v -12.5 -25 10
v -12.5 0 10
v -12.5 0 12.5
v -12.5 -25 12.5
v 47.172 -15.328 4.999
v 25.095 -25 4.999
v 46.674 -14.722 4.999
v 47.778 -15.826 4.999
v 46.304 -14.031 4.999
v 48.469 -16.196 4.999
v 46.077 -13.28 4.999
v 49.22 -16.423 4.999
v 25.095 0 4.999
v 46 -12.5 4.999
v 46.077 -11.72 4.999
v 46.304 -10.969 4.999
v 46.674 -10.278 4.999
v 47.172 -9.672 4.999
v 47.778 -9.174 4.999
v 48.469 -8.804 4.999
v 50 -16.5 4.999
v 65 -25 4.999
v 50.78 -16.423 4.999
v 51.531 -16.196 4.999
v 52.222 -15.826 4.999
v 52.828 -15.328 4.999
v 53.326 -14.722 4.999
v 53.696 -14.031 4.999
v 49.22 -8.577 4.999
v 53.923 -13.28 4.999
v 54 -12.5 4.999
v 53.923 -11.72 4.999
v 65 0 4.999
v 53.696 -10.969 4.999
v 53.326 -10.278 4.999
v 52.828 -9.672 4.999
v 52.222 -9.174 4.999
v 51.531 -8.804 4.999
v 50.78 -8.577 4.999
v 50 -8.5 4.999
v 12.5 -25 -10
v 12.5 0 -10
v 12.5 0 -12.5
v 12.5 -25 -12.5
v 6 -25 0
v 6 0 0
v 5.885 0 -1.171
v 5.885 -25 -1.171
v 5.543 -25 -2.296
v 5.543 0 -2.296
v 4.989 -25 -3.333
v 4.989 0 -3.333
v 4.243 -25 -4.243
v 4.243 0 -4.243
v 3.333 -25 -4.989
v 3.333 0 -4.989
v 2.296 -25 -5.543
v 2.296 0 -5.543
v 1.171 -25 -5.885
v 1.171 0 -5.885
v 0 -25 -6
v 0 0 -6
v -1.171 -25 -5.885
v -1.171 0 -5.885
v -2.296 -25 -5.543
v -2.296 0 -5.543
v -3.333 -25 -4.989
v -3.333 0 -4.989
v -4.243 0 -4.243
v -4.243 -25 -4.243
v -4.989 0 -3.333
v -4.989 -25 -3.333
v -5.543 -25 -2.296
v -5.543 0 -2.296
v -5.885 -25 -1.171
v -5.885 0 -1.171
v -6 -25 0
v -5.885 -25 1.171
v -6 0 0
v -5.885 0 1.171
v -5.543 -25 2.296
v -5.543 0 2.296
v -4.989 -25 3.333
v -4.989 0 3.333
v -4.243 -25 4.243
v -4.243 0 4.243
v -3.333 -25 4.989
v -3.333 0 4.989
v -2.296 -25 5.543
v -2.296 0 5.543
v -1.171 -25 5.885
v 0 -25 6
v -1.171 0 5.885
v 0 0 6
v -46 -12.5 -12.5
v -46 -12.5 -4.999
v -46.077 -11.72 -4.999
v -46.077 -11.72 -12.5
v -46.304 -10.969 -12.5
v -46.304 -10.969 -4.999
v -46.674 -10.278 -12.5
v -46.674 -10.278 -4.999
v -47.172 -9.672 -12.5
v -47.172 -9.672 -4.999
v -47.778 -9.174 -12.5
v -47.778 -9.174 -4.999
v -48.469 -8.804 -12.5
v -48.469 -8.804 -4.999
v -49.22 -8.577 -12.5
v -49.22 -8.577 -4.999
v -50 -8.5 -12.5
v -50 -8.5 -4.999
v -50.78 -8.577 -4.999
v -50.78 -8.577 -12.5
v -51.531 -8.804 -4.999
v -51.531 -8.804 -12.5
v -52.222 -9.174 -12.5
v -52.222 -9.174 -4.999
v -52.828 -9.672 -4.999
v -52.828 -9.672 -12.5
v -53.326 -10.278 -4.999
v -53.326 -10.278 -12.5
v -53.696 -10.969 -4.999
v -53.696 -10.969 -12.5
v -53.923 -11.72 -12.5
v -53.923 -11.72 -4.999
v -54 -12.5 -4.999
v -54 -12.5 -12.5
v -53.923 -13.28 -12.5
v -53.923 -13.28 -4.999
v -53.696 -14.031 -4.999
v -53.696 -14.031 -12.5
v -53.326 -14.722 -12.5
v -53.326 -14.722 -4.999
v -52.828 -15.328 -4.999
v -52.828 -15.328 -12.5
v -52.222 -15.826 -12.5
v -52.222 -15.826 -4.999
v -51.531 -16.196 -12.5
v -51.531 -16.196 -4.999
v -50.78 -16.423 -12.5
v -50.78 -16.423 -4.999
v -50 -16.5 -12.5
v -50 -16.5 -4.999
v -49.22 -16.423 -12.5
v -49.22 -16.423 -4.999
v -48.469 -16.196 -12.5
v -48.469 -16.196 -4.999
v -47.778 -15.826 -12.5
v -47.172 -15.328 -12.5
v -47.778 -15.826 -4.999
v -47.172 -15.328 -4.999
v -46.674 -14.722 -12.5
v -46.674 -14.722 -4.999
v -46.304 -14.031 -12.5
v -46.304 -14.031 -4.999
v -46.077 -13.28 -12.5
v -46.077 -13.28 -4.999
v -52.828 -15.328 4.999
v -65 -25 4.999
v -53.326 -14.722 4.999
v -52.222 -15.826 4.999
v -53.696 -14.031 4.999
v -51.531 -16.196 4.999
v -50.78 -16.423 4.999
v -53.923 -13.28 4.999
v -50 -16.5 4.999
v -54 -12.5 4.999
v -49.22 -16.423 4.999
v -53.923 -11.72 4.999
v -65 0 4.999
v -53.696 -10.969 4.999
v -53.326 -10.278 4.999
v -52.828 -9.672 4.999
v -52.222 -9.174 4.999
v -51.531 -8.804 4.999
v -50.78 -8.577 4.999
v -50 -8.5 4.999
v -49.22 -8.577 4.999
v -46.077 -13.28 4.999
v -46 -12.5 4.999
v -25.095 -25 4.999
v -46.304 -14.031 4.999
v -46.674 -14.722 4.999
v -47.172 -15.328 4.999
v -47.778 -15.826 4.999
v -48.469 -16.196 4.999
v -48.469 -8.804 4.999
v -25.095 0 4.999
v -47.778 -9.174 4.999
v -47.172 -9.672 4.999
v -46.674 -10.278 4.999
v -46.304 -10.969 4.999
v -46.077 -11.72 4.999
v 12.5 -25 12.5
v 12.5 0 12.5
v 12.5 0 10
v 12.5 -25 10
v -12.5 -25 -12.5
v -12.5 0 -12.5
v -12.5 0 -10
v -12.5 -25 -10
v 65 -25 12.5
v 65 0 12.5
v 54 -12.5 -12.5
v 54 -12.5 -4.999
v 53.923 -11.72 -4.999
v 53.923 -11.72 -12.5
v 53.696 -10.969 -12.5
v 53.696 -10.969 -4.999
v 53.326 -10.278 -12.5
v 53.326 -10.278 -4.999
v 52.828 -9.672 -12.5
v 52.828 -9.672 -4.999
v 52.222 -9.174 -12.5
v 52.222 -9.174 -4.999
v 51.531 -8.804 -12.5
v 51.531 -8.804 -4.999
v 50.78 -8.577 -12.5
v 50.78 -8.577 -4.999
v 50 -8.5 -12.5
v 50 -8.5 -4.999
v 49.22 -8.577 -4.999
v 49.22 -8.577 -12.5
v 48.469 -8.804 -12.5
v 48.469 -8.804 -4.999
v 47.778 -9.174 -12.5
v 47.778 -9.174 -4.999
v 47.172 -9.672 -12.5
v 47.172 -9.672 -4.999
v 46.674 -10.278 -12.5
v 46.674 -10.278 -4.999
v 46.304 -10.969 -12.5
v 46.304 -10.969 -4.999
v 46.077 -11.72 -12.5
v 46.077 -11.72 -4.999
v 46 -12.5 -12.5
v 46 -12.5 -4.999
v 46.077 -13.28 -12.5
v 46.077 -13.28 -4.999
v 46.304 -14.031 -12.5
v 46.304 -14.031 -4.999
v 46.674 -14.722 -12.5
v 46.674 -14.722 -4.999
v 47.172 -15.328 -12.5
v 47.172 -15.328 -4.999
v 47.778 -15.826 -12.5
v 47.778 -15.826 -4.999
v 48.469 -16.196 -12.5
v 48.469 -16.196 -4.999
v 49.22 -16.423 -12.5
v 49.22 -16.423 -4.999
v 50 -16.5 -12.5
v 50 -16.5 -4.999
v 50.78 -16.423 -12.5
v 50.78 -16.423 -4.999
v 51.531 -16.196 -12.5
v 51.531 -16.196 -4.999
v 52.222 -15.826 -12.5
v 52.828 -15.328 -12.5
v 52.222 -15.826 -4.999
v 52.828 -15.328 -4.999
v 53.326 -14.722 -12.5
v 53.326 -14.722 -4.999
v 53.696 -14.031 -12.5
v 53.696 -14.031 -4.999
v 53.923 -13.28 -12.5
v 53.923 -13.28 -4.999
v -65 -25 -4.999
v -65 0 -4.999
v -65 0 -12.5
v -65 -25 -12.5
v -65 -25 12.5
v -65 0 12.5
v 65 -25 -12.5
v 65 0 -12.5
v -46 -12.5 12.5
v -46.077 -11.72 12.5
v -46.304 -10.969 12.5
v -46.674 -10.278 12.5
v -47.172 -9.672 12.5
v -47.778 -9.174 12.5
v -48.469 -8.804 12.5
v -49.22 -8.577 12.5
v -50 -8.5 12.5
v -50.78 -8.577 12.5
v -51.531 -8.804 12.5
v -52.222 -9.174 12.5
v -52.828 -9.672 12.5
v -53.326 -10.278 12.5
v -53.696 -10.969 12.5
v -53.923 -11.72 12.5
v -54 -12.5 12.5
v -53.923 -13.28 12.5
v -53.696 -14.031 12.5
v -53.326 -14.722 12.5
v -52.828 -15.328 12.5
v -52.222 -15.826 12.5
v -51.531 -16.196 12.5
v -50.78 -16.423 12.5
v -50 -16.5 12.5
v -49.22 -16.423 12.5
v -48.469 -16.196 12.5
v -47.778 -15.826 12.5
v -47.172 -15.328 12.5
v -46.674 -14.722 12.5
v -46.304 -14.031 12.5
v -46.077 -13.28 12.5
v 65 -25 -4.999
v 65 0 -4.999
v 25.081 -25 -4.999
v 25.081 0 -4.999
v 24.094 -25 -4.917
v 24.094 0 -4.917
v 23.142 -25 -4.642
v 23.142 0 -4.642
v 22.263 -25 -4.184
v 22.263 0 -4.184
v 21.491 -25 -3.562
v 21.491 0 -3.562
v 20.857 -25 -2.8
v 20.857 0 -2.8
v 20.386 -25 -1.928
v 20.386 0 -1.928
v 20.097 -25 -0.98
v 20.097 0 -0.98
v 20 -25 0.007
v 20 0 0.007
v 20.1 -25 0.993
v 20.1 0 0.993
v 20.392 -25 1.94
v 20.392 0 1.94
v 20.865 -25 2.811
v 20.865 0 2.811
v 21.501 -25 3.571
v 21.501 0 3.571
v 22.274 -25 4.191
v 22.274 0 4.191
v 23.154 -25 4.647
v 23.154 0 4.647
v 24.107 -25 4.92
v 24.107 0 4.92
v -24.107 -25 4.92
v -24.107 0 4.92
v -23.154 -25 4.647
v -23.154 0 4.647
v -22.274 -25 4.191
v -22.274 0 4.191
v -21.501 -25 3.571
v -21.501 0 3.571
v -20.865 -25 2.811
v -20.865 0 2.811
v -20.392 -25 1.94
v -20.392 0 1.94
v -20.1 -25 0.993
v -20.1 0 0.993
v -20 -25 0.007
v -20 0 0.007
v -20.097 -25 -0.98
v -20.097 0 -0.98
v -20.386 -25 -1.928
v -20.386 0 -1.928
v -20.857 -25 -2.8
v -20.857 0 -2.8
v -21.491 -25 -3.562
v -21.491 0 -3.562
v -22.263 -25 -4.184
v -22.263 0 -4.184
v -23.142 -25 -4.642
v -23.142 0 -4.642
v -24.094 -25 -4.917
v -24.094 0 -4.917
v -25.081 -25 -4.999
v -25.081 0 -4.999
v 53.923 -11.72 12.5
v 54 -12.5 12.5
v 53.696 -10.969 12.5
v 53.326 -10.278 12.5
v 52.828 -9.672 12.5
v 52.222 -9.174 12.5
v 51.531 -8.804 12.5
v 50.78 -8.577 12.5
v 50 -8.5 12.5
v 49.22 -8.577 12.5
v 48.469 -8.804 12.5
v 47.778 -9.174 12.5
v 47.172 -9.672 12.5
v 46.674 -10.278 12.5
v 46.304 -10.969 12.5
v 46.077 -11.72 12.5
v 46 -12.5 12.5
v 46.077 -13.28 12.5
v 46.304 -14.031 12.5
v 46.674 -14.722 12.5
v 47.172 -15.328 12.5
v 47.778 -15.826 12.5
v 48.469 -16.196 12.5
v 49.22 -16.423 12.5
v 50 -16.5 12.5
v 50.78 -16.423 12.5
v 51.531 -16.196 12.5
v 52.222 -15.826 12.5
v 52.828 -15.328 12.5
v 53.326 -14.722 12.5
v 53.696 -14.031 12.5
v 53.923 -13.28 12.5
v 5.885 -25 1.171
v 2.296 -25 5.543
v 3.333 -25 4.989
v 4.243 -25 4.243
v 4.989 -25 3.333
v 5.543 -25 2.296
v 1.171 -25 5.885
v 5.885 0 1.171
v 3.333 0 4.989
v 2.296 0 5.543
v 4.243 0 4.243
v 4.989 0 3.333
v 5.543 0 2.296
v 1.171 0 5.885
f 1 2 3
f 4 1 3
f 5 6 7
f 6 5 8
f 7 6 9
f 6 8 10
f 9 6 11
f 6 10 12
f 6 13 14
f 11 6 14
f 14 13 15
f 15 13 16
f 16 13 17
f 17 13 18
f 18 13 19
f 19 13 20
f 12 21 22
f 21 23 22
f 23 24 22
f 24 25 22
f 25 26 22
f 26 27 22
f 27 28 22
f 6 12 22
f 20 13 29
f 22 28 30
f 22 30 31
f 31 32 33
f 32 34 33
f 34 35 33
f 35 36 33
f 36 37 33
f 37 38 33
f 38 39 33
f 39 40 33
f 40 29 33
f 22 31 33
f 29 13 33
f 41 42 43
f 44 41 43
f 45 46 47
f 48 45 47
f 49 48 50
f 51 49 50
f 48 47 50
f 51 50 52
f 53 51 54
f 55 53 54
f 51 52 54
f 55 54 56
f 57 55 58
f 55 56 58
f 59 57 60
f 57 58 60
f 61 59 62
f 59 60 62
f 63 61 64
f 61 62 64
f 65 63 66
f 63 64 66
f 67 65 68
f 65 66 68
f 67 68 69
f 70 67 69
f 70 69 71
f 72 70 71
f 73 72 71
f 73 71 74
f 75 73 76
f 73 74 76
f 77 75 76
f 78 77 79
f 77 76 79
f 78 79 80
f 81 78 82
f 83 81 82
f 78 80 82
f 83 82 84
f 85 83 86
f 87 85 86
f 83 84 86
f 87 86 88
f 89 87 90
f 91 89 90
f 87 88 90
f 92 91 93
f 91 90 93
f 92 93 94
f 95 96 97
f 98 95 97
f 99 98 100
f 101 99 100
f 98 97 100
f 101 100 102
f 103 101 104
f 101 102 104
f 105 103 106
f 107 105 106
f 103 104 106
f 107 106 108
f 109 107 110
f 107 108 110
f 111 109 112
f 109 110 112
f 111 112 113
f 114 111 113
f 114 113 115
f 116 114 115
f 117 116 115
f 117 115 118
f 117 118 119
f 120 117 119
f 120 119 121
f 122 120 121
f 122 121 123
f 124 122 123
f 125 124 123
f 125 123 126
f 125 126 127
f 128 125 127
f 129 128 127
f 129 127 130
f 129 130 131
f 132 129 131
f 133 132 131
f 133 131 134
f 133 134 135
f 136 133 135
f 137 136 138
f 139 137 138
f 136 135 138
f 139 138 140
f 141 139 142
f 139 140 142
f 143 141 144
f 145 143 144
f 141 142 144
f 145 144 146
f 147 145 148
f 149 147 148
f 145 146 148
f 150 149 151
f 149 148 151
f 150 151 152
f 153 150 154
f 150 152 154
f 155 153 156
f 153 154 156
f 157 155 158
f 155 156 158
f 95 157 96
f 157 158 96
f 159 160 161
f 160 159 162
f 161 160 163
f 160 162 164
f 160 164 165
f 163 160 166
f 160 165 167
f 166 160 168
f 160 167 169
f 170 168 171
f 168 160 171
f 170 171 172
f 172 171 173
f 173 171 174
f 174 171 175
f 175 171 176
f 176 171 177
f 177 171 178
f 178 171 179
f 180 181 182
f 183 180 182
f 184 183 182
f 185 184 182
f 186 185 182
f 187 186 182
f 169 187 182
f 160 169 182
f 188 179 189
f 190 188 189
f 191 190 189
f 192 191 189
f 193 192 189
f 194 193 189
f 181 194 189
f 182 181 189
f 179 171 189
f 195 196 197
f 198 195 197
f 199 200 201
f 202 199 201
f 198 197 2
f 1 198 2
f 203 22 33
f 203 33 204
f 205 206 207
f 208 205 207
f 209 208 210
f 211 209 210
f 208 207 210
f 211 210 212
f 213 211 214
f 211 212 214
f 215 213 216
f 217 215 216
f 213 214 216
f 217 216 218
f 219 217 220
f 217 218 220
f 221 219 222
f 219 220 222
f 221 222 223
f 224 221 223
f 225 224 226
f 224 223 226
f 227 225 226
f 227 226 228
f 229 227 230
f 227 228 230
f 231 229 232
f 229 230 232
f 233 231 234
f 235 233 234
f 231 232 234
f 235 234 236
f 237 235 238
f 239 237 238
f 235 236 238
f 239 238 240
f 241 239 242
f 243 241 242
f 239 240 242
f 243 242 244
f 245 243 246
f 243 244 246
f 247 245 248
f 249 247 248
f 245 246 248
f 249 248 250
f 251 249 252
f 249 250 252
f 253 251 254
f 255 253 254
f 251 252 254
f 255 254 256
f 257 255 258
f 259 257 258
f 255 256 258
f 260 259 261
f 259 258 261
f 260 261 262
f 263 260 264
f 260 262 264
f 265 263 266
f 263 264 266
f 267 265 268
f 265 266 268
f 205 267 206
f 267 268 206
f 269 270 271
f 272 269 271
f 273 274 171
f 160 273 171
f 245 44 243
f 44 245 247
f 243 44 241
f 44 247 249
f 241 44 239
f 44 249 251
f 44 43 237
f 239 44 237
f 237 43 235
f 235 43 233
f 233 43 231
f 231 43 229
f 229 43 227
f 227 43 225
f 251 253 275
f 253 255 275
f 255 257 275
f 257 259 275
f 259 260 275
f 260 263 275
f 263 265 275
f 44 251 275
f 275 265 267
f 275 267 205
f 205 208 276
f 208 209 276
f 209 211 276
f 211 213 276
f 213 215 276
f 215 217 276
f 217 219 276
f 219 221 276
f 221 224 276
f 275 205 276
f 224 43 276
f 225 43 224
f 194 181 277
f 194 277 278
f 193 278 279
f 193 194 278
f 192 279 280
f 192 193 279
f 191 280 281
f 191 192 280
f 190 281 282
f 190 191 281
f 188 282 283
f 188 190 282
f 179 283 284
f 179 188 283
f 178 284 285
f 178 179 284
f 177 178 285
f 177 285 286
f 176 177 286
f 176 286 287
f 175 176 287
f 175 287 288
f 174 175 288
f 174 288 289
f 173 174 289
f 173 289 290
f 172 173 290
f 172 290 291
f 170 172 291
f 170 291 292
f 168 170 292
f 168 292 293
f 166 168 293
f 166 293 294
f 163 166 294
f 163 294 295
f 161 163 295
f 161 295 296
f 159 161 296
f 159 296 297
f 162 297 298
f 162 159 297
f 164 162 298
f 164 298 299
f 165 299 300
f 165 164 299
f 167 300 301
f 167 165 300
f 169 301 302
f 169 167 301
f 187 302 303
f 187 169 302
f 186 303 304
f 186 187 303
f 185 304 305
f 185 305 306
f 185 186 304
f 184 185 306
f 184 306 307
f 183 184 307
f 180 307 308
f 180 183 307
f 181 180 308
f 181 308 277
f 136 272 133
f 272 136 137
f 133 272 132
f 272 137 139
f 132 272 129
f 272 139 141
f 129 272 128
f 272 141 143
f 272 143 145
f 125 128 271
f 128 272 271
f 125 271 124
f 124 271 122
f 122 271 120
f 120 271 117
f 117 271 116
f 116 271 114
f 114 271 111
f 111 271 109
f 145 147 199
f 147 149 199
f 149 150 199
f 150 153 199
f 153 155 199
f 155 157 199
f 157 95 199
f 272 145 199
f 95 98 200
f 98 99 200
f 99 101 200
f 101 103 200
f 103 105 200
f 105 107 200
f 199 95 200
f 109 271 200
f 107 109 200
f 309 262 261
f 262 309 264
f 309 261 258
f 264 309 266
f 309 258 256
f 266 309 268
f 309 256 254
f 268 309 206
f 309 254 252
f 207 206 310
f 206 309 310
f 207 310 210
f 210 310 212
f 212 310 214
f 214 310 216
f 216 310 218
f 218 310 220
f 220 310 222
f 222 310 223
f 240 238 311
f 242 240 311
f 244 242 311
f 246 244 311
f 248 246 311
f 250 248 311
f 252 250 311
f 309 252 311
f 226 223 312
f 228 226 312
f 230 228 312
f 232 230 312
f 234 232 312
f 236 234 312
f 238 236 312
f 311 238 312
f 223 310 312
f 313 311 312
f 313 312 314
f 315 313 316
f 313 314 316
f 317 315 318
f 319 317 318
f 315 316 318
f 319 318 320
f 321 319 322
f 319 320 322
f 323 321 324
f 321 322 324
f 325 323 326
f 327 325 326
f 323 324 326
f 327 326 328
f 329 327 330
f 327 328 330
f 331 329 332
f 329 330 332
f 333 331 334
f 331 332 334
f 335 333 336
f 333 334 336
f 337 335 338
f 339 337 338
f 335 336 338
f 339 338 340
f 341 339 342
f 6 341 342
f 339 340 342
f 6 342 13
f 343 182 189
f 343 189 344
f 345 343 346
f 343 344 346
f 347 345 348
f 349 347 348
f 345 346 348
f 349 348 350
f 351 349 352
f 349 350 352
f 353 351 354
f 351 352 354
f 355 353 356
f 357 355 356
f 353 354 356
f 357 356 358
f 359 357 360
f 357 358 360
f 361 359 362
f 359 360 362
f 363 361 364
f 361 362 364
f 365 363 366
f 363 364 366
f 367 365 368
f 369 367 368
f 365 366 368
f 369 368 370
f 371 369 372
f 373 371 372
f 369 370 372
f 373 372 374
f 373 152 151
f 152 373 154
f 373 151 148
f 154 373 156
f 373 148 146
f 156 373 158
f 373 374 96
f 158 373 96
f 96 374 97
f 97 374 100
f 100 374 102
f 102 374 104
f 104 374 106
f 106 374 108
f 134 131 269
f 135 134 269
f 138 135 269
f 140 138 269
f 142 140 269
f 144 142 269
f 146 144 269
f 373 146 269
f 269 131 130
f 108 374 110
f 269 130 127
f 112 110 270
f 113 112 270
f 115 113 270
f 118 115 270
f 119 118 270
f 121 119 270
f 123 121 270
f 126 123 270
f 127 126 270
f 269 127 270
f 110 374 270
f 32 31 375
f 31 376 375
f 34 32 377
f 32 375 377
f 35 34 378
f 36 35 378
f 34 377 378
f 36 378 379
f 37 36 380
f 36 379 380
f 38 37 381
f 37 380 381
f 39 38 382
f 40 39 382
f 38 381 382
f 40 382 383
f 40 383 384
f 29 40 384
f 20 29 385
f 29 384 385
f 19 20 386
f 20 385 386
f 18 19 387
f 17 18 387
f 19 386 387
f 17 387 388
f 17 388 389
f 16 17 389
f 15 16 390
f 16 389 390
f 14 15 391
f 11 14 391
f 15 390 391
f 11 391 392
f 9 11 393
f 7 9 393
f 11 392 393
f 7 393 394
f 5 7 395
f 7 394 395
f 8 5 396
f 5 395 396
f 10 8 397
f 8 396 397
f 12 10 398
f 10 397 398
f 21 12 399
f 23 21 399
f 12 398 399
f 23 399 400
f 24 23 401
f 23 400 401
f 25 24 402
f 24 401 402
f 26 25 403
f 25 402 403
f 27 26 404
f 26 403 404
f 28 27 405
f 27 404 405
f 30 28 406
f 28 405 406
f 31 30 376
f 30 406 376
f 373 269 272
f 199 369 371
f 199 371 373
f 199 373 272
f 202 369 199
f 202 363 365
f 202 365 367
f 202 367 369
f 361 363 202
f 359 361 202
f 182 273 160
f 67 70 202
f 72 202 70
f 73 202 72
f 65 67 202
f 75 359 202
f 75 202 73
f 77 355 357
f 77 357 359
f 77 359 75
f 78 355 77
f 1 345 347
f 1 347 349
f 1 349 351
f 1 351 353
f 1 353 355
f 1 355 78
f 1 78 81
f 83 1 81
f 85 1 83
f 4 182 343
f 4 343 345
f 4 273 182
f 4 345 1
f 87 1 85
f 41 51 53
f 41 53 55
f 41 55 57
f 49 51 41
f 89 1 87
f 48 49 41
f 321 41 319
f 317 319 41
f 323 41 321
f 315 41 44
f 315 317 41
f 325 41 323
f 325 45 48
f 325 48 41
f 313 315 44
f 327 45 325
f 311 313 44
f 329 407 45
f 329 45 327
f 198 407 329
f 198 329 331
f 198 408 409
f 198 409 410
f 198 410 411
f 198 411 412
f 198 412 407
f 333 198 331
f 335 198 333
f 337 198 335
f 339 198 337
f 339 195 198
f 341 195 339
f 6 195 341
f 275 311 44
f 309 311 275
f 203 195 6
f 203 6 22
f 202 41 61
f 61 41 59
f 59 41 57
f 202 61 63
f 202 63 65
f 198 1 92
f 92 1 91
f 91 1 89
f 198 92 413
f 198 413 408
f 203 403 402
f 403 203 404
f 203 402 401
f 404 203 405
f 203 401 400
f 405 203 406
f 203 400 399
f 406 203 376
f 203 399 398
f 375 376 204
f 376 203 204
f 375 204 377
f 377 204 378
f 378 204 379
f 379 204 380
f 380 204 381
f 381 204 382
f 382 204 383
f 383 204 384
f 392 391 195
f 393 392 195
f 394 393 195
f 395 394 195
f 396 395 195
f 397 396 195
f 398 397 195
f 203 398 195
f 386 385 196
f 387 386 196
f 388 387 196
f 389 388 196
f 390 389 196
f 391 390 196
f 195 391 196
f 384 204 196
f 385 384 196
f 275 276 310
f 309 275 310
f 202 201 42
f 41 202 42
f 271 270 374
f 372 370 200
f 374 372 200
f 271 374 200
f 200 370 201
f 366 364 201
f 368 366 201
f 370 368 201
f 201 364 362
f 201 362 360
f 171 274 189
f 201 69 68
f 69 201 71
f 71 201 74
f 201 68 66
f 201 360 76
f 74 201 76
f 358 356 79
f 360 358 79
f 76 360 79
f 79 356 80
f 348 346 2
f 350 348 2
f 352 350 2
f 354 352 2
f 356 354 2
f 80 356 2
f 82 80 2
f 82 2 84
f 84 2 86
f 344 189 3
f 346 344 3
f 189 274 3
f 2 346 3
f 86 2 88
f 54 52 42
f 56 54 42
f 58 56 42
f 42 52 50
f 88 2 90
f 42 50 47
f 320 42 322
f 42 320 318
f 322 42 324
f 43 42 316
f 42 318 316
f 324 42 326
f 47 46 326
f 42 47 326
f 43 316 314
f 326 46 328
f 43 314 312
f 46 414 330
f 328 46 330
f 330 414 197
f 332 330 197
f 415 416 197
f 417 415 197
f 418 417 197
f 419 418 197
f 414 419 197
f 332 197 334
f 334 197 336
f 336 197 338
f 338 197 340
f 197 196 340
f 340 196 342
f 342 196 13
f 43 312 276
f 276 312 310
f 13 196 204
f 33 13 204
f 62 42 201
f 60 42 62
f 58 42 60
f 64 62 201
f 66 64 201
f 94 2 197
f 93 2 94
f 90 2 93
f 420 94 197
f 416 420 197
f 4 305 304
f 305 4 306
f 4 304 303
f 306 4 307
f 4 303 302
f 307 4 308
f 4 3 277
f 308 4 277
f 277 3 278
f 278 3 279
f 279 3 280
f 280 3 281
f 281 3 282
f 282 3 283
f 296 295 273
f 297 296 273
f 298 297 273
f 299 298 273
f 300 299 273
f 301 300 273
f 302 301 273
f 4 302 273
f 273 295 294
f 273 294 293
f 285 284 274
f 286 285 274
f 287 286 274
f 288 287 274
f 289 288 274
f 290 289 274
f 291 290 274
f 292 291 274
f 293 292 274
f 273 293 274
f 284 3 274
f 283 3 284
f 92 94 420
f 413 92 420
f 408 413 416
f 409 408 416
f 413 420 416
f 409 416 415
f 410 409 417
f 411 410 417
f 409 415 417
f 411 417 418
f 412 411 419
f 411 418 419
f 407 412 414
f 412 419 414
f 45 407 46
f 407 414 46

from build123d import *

# Parameters (mm, degrees)
F1_DEPTH = 25
F2_R     = 4
F3_DEPTH = 12.5


with BuildPart() as f1:
    # F0 (on Front) → F1 (new body)
    with BuildSketch(Plane.XZ):
        with BuildLine():
            Line((-12.5, 12.5), (-65, 12.5))
            Line((-65, 12.5), (-65, 4.999099))
            Line((-65, 4.999099), (-25.094896, 4.999099))
            ThreePointArc((-25.094896, 4.999099), (-20.000005, 0.006726), (-25.081447, -4.999337))
            Line((-25.081447, -4.999337), (-65, -4.999337))
            Line((-65, -4.999337), (-65, -12.5))
            Line((-65, -12.5), (-12.5, -12.5))
            Line((-12.5, -12.5), (-12.5, -10))
            Line((-12.5, -10), (12.5, -10))
            Line((12.5, -10), (12.5, -12.5))
            Line((12.5, -12.5), (65, -12.5))
            Line((65, -12.5), (65, -4.999337))
            Line((65, -4.999337), (25.081447, -4.999337))
            ThreePointArc((25.081447, -4.999337), (20.000005, 0.006726), (25.094896, 4.999099))
            Line((25.094896, 4.999099), (65, 4.999099))
            Line((65, 4.999099), (65, 12.5))
            Line((65, 12.5), (12.5, 12.5))
            Line((12.5, 12.5), (12.5, 10))
            Line((12.5, 10), (0, 10))
            Line((0, 10), (-12.5, 10))
            Line((-12.5, 10), (-12.5, 12.5))
        make_face()
        with BuildLine():
            ThreePointArc((6, 0), (-4.242641, -4.242641), (0, 6))
            ThreePointArc((0, 6), (4.242641, 4.242641), (6, 0))
        make_face(mode=Mode.SUBTRACT)
    extrude(amount=F1_DEPTH)

    # F2 (on Top) → F3 (cut, symmetric)
    with BuildSketch(Plane.XY):
        with Locations((-50, -12.5)):
            Circle(F2_R)
        with Locations((50, -12.5)):
            Circle(F2_R)
    extrude(amount=F3_DEPTH, both=True, mode=Mode.SUBTRACT)


solid = f1.part
